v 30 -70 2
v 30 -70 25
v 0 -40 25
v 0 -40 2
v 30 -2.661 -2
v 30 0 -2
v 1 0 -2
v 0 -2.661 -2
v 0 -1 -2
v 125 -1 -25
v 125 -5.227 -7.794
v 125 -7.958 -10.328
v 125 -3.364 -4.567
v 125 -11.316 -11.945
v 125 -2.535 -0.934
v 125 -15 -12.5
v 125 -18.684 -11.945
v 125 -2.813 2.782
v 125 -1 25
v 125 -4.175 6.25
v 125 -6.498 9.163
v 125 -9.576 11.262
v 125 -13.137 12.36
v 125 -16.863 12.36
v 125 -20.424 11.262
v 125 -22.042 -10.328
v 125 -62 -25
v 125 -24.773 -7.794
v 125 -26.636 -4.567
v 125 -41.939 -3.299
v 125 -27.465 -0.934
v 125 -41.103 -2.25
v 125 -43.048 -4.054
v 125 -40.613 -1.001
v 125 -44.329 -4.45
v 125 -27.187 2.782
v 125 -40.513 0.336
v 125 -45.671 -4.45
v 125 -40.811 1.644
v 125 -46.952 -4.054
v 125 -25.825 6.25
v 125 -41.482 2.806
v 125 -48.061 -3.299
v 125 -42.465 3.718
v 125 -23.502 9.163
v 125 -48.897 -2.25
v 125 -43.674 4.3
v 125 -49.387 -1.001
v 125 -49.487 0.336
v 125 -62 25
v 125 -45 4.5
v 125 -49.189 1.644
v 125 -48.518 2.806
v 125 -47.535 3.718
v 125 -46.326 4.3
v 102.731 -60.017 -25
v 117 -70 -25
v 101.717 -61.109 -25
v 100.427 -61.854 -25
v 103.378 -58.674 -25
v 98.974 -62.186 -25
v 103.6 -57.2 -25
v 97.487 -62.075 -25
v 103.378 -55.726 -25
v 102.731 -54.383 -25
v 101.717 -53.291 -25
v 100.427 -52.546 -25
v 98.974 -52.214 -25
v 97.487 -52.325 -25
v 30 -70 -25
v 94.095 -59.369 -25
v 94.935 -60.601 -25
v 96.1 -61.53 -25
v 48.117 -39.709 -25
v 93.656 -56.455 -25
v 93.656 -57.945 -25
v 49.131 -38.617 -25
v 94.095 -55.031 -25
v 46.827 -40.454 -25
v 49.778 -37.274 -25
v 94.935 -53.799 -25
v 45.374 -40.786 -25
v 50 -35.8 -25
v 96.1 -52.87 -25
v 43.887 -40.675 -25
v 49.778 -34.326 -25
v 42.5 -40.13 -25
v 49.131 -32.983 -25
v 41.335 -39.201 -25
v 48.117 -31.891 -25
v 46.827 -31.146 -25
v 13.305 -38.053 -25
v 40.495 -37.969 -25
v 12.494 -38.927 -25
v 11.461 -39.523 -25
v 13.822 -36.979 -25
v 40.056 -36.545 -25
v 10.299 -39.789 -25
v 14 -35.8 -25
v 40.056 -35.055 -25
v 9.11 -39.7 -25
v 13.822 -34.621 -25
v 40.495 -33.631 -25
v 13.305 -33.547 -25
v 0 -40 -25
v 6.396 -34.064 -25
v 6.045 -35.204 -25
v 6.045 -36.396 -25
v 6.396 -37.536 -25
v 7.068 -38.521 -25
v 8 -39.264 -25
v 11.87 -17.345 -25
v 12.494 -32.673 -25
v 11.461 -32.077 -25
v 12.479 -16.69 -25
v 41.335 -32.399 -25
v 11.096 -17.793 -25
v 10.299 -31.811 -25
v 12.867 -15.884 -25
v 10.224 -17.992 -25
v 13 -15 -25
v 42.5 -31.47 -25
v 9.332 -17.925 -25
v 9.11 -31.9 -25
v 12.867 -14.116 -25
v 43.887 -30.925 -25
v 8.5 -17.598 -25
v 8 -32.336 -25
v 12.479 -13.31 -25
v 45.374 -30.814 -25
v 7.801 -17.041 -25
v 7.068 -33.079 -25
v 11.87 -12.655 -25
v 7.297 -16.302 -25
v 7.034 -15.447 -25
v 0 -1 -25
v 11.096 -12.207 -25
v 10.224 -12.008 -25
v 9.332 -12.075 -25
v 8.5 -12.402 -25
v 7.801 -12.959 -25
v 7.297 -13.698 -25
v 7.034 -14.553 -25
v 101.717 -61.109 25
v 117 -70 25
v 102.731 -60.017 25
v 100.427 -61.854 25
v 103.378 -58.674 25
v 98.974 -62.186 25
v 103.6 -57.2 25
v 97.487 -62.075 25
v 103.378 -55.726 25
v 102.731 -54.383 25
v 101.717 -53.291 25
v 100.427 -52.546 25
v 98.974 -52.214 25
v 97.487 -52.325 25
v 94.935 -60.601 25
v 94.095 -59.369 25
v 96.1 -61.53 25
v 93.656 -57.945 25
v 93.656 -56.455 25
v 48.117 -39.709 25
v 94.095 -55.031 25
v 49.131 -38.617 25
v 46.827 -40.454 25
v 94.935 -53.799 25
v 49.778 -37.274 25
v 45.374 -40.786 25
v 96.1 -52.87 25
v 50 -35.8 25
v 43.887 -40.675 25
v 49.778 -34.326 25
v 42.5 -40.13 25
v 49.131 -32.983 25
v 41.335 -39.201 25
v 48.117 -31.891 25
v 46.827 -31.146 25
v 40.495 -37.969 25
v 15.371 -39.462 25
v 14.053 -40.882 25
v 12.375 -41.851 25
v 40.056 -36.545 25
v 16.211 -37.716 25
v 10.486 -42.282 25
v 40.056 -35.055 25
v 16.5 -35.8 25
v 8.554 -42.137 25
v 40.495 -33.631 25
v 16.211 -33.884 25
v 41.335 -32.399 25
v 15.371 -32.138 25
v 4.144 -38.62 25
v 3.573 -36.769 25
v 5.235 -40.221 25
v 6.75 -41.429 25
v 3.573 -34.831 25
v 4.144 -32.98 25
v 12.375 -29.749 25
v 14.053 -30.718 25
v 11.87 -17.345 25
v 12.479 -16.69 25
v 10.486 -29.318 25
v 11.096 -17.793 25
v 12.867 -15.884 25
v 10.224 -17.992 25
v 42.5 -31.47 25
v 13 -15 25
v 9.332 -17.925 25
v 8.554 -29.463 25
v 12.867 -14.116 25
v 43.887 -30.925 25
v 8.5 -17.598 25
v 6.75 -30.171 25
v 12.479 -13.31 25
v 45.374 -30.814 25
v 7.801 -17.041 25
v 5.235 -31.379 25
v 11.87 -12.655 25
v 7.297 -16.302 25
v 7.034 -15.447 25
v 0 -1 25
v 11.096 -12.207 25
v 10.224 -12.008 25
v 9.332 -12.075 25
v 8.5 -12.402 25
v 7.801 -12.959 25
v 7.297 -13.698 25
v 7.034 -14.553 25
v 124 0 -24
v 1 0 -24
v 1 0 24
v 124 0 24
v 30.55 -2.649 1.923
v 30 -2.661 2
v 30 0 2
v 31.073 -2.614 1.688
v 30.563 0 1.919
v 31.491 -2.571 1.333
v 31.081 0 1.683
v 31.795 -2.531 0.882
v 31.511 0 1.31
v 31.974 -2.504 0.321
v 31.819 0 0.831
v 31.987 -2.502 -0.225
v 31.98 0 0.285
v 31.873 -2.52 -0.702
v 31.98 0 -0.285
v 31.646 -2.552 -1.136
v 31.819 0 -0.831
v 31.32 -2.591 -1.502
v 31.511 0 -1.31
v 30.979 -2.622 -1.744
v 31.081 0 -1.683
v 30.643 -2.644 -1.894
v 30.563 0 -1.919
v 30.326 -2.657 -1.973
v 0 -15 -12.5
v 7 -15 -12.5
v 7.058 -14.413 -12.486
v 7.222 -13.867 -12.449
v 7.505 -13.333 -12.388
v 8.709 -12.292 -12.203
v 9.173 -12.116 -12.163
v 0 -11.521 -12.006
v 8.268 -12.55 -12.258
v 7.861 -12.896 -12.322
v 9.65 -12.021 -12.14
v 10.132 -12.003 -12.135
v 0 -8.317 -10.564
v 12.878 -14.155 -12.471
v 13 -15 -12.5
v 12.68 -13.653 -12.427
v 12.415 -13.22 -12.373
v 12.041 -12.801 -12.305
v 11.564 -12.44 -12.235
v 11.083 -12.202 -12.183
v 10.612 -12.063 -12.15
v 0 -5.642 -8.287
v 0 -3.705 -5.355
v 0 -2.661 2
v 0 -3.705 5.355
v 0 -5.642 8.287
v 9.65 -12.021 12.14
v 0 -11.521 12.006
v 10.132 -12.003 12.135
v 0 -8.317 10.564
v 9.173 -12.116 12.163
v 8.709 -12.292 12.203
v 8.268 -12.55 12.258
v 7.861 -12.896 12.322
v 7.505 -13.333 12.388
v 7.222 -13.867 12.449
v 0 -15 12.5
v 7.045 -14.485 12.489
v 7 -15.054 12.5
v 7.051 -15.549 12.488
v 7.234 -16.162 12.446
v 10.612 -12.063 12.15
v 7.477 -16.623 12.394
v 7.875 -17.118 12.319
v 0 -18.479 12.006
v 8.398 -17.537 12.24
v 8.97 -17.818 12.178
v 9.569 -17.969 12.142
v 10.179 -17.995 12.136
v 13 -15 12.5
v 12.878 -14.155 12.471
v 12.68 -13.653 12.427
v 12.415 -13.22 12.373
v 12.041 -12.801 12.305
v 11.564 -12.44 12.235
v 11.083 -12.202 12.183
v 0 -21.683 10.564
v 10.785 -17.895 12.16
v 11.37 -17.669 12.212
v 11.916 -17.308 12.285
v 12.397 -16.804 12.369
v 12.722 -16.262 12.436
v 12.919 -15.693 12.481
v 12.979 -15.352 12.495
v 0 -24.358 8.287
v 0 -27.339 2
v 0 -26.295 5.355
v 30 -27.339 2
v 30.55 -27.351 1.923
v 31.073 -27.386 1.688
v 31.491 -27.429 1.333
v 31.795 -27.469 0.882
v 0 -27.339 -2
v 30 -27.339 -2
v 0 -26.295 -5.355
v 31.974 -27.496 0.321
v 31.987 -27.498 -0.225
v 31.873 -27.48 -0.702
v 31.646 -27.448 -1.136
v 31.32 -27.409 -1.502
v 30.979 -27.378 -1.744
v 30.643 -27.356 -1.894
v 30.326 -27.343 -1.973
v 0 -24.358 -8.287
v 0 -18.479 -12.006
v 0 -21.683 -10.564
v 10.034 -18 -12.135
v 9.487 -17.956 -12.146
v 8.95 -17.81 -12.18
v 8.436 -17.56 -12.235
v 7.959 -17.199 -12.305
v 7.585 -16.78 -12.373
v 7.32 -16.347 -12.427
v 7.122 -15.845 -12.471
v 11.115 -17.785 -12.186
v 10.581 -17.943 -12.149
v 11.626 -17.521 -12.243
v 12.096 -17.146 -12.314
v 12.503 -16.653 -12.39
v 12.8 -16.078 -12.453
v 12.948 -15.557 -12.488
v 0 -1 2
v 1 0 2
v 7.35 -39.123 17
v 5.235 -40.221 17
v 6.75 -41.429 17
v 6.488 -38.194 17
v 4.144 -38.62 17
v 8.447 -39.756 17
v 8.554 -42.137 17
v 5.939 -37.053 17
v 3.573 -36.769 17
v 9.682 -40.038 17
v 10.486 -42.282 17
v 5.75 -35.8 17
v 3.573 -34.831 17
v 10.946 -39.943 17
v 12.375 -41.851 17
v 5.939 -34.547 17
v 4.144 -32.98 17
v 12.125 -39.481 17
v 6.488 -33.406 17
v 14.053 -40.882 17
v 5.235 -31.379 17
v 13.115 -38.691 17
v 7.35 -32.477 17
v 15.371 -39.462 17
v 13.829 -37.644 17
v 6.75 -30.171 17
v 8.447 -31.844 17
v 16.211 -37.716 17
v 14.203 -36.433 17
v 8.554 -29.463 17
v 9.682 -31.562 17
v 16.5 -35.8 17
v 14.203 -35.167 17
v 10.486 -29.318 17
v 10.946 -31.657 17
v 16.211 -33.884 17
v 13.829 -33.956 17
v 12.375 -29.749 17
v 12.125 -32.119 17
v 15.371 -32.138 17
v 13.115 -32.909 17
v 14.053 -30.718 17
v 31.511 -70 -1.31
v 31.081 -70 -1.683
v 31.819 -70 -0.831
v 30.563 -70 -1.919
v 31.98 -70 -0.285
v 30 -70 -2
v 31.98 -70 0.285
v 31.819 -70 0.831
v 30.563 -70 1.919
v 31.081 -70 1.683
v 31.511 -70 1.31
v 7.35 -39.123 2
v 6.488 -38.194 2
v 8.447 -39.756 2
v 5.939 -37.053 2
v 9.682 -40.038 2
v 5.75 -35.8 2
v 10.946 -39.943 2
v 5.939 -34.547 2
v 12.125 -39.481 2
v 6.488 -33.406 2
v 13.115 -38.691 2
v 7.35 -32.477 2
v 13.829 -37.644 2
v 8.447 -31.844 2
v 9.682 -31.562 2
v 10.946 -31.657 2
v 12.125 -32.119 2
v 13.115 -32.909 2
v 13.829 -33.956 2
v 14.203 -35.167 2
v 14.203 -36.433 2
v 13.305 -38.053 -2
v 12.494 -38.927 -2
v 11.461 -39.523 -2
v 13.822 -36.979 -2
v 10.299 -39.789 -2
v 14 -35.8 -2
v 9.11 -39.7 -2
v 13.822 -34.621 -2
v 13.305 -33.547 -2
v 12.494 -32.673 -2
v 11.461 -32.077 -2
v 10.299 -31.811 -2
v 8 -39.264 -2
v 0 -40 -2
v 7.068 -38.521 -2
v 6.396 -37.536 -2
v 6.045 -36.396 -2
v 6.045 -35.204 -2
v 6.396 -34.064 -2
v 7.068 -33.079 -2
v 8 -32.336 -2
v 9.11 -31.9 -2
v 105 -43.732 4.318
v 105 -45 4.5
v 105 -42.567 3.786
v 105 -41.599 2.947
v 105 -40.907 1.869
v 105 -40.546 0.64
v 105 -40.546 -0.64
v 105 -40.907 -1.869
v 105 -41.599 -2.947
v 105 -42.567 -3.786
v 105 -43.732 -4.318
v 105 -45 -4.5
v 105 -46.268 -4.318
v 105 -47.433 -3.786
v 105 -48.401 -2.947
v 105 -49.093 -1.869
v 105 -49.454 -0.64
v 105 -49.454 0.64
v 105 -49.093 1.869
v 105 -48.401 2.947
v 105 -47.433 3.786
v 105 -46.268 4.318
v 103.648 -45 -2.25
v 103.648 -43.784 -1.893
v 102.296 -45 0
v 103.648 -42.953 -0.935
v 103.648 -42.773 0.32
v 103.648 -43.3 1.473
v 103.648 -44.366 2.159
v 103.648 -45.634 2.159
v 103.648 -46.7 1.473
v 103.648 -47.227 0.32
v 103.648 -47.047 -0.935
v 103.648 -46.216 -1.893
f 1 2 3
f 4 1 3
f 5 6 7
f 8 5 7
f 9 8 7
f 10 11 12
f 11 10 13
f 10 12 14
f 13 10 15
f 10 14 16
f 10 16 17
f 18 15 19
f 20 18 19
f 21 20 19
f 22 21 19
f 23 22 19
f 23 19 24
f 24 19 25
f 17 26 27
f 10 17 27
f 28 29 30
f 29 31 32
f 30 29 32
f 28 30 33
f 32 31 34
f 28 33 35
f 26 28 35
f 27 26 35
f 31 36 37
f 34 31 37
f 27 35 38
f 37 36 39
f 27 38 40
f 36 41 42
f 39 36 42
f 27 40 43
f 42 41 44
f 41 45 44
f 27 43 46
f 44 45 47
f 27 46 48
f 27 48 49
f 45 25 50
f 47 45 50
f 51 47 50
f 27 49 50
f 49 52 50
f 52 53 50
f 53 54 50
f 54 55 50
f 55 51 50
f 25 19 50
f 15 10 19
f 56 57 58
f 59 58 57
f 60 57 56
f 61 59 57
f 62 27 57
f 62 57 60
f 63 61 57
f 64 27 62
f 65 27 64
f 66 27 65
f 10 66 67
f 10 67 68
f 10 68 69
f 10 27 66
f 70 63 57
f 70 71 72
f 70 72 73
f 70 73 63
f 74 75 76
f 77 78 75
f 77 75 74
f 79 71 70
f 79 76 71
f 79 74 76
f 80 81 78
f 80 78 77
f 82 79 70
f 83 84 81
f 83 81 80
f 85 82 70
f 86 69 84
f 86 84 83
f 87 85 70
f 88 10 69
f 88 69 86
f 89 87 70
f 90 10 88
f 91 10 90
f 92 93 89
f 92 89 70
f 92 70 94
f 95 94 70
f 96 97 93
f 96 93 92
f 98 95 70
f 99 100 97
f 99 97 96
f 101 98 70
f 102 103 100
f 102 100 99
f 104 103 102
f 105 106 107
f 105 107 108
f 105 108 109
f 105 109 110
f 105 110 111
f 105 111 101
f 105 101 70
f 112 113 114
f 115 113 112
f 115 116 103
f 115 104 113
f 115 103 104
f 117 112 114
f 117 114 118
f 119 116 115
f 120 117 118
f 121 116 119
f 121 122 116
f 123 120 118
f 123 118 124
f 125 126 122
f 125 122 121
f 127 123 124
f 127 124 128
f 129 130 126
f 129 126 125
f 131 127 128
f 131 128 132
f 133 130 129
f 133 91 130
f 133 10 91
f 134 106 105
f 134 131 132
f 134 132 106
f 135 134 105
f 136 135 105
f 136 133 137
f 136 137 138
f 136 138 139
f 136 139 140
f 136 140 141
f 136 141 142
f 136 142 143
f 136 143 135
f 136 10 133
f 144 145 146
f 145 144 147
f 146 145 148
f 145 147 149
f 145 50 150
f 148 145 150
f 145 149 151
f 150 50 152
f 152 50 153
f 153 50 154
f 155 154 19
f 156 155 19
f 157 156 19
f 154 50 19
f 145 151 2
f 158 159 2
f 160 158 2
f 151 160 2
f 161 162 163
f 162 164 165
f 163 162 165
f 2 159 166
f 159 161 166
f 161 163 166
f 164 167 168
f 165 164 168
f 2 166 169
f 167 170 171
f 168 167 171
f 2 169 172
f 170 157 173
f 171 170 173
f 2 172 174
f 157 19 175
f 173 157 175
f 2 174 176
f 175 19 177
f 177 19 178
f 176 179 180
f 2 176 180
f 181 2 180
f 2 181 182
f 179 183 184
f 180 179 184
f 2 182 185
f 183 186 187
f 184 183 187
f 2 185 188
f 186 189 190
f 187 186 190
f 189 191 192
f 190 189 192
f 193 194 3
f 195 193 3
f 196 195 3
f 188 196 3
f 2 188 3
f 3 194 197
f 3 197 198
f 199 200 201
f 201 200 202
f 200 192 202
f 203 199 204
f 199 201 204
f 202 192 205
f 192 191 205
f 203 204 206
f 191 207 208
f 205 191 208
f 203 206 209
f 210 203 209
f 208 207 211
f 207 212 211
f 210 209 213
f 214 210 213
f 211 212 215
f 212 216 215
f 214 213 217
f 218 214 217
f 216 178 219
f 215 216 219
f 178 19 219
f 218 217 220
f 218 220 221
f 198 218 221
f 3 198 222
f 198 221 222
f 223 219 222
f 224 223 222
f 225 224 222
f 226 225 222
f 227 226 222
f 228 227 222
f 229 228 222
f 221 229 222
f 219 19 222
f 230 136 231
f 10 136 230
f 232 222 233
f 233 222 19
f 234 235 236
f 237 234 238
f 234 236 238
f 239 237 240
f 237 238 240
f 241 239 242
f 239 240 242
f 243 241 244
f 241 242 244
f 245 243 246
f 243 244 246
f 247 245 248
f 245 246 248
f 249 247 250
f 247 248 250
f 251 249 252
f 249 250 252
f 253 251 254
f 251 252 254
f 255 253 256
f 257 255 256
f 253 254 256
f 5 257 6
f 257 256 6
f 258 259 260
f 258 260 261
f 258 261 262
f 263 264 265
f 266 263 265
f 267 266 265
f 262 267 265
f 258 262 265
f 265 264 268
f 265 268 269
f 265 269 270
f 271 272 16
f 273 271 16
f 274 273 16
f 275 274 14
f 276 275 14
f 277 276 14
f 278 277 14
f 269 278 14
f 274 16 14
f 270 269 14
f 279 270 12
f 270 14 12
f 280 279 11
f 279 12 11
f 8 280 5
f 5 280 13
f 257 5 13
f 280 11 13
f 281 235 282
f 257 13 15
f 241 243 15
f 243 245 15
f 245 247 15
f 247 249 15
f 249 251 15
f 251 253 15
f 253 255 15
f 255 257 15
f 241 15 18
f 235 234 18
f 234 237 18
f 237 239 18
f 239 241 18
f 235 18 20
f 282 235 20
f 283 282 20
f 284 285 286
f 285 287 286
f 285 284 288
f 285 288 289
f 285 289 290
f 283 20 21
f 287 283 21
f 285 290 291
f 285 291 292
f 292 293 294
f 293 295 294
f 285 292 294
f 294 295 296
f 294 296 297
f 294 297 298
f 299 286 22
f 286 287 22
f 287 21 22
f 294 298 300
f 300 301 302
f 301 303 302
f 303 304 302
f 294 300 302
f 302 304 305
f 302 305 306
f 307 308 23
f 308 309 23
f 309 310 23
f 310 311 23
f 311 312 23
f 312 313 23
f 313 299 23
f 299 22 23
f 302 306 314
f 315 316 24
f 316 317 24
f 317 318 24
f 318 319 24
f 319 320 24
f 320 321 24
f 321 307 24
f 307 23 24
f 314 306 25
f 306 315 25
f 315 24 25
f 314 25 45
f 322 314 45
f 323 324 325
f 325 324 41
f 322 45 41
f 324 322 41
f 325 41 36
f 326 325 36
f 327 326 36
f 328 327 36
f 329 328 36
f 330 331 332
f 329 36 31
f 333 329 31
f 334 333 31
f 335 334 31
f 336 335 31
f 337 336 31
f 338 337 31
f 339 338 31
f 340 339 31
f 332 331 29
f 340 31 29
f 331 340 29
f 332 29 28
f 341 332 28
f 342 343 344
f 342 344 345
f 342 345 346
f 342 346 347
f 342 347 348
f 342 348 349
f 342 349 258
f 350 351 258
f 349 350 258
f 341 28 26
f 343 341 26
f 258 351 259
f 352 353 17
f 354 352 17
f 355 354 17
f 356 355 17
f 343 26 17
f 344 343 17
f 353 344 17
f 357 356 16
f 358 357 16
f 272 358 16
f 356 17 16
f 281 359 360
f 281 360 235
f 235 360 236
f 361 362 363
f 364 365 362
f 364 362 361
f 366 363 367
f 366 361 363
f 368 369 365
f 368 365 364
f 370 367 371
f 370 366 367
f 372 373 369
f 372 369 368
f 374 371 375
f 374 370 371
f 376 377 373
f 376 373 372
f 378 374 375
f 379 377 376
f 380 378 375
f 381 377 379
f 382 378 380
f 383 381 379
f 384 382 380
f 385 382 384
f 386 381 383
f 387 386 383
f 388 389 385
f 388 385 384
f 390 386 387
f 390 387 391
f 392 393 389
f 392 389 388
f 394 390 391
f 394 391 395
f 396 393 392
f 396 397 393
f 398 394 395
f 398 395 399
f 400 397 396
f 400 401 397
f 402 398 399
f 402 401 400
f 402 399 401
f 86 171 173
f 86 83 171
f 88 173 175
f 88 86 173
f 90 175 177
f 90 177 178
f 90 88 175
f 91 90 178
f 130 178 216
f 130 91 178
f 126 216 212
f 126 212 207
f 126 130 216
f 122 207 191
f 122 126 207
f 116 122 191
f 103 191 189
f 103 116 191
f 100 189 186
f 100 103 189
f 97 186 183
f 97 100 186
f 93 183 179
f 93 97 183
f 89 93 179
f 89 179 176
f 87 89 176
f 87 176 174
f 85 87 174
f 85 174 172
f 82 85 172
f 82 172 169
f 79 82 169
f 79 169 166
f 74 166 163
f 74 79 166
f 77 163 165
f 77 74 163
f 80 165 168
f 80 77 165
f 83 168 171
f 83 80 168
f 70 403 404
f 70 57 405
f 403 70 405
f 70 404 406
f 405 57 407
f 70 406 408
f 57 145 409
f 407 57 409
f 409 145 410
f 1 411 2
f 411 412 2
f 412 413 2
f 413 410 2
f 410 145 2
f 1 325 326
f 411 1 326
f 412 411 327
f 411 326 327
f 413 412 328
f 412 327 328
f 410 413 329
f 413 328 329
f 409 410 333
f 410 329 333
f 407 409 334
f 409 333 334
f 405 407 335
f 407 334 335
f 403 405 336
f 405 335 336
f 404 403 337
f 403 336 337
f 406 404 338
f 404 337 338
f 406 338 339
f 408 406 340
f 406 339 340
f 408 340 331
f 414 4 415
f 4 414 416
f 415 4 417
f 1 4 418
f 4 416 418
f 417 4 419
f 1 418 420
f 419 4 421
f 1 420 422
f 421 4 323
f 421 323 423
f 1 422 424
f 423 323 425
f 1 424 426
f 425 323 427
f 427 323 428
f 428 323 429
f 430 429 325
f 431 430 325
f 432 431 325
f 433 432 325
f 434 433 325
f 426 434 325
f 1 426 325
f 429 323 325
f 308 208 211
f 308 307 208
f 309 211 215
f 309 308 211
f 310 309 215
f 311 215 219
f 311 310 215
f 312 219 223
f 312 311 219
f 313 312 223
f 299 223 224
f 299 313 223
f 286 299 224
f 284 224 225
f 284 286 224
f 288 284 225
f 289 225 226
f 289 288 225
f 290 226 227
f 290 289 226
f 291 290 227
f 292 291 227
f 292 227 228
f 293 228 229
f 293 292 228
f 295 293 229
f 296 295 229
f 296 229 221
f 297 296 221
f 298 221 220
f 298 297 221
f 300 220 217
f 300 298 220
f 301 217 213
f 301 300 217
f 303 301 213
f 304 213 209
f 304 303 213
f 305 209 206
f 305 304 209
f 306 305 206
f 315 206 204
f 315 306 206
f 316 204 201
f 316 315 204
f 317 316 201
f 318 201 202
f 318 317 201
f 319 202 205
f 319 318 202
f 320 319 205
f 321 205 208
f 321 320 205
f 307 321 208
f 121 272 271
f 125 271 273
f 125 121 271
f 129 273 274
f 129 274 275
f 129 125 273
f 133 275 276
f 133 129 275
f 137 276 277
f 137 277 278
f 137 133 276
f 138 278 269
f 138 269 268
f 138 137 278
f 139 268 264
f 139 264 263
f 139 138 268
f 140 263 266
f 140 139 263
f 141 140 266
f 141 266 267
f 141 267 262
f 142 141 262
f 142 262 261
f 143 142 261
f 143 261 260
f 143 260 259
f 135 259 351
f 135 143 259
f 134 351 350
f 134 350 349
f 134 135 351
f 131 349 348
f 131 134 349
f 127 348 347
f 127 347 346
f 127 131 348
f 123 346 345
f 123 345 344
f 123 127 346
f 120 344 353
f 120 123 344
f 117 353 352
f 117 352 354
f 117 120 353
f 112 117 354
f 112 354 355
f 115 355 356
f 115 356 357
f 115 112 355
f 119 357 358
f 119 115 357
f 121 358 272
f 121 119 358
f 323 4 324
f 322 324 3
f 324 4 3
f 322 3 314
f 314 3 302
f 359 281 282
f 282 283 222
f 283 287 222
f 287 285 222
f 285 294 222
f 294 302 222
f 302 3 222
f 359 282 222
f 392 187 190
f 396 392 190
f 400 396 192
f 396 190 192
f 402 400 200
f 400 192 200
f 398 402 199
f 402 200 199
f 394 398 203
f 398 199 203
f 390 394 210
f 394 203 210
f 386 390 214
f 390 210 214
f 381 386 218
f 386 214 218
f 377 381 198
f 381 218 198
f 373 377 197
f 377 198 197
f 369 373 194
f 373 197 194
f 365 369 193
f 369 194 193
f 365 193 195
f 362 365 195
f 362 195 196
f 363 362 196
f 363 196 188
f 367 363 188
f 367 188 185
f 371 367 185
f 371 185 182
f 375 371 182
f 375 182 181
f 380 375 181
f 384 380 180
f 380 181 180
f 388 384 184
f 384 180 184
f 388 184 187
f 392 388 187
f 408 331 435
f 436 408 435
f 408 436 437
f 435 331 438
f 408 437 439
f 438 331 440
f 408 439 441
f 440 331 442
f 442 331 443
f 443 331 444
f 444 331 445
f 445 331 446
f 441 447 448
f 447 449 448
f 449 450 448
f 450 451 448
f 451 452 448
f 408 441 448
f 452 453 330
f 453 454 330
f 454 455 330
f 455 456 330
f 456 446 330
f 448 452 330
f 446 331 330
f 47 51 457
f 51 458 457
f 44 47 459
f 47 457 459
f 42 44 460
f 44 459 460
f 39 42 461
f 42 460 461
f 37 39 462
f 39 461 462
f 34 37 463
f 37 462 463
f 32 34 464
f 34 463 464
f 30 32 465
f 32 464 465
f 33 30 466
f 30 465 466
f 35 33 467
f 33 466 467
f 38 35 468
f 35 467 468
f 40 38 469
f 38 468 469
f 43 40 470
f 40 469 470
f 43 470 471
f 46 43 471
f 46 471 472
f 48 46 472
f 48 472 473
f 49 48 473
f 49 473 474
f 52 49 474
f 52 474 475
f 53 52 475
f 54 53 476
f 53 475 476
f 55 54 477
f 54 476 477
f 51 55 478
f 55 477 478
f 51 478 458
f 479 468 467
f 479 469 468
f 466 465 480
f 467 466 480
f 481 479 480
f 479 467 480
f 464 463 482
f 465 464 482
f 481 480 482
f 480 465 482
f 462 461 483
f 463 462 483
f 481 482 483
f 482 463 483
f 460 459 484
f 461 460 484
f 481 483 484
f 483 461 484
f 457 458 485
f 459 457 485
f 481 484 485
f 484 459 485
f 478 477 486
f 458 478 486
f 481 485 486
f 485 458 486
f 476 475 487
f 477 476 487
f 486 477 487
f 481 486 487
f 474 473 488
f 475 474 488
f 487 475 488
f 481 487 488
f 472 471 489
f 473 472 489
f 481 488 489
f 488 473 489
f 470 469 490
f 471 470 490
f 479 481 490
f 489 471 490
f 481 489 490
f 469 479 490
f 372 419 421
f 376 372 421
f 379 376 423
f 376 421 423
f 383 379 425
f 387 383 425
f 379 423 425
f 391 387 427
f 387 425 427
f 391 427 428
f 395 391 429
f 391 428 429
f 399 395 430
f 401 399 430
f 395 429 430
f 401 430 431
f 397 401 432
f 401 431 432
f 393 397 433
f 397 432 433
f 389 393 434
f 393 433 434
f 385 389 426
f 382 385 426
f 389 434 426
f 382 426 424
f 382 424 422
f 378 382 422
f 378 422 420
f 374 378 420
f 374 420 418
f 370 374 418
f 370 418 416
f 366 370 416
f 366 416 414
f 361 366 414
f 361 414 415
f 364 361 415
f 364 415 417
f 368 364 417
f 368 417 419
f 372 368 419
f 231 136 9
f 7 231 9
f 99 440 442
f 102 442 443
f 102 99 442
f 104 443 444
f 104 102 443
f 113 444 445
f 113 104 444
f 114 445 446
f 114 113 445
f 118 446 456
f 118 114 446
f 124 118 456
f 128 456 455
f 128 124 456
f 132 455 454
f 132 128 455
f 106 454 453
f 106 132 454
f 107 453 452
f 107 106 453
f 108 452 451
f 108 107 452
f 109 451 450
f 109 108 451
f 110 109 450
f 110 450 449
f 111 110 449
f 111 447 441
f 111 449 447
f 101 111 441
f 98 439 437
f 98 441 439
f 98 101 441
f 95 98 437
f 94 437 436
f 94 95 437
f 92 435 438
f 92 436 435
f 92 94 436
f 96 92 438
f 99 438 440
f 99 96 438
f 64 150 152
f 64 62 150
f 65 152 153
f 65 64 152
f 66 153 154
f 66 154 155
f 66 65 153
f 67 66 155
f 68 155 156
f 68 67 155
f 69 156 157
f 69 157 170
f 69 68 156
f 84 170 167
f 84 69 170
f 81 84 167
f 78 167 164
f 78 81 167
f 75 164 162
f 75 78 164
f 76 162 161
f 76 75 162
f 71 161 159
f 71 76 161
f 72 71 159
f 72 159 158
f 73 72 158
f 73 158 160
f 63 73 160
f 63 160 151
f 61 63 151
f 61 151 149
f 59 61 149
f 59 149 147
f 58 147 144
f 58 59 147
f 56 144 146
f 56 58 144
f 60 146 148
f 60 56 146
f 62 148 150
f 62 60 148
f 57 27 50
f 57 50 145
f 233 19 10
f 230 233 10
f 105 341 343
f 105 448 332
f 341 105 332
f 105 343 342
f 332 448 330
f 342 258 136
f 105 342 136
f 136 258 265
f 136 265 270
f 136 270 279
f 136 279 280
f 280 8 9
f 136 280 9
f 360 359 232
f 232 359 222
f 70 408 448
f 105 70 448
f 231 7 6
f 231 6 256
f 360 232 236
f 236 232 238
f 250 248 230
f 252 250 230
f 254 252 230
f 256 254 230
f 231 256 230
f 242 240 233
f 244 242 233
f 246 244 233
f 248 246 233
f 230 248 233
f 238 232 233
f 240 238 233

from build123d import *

# Parameters (mm, degrees)
CROQUIS1_R                     = 3
CROQUIS1_R_2                   = 4
CROQUIS1_R_3                   = 5
SALIENTE_EXTRUIR1_DEPTH        = 25
CHAFL_N1_SIZE                  = 1
CORTAR_EXTRUIR1_DEPTH          = 94.3
CROQUIS3_R                     = 4.25
CORTAR_EXTRUIR2_DEPTH          = 94.3
CROQUIS4_R                     = 6.5
CORTAR_EXTRUIR3_DEPTH          = 8
CROQUIS5_R                     = 12.5
CORTAR_EXTRUIR4_DEPTH          = 141.5
TALADRO_ROSCADO_M10X1_01_D     = 9
TALADRO_ROSCADO_M10X1_01_DEPTH = 20
TALADRO_ROSCADO_M10X1_01_TIP   = 2.703872786


with BuildPart() as part:
    # Croquis1 → Saliente-Extruir1 (new body, symmetric)
    with BuildSketch(Plane.XY):
        Polygon((0, 0), (125, 0), (125, -62), (117, -70), (30, -70), (0, -40), align=None)
        with Locations((10, -15)):
            Circle(CROQUIS1_R, mode=Mode.SUBTRACT)
        with Locations((10, -35.8)):
            Circle(CROQUIS1_R_2, mode=Mode.SUBTRACT)
        with Locations((45, -35.8)):
            Circle(CROQUIS1_R_3, mode=Mode.SUBTRACT)
        with Locations((98.6, -57.2)):
            Circle(CROQUIS1_R_3, mode=Mode.SUBTRACT)
    extrude(amount=SALIENTE_EXTRUIR1_DEPTH, both=True)

    # Chaflán1
    chafl_n1_edges = [part.edges().sort_by_distance(p)[0] for p in [
        (0, 0, 0),
        (125, 0, 0),
        (62.5, 0, 25),
        (62.5, 0, -25),
    ]]
    chamfer(chafl_n1_edges, length=CHAFL_N1_SIZE)

    # Croquis2 → Cortar-Extruir1 (cut)
    with BuildSketch(Plane(origin=(0, 0, 0), x_dir=(1, 0, 0), z_dir=(0, 1, 0))):
        with BuildLine():
            Line((30, 2), (-5.316293701, 2))
            Line((-5.316293701, 2), (-5.316293701, -2))
            Line((-5.316293701, -2), (30, -2))
            ThreePointArc((30, -2), (32, 0), (30, 2))
        make_face()
    extrude(amount=-CORTAR_EXTRUIR1_DEPTH, mode=Mode.SUBTRACT)

    # Croquis3 → Cortar-Extruir2 (cut)
    with BuildSketch(Plane(origin=(0, 0, 2), x_dir=(-1, 0, 0), z_dir=(0, 0, -1))):
        with Locations((-10, -35.8)):
            Circle(CROQUIS3_R)
    extrude(amount=-CORTAR_EXTRUIR2_DEPTH, mode=Mode.SUBTRACT)

    # Croquis4 → Cortar-Extruir3 (cut)
    with BuildSketch(Plane.XY.offset(25)):
        with Locations((10, -35.8)):
            Circle(CROQUIS4_R)
    extrude(amount=-CORTAR_EXTRUIR3_DEPTH, mode=Mode.SUBTRACT)

    # Croquis5 → Cortar-Extruir4 (cut)
    with BuildSketch(Plane(origin=(125, 0, 0), x_dir=(0, 0, -1), z_dir=(1, 0, 0))):
        with Locations((0, -15)):
            Circle(CROQUIS5_R)
    extrude(amount=-CORTAR_EXTRUIR4_DEPTH, mode=Mode.SUBTRACT)

    # Taladro roscado M10x1.01
    with Locations(Plane(origin=(125, 0, 0), x_dir=(0, 0, -1), z_dir=(1, 0, 0))):
        with Locations((0, -45)):
            Hole(TALADRO_ROSCADO_M10X1_01_D / 2, depth=TALADRO_ROSCADO_M10X1_01_DEPTH)
            with Locations((0, 0, -(TALADRO_ROSCADO_M10X1_01_DEPTH + TALADRO_ROSCADO_M10X1_01_TIP / 2))):  # 118° drill point
                Cone(0, TALADRO_ROSCADO_M10X1_01_D / 2, TALADRO_ROSCADO_M10X1_01_TIP, mode=Mode.SUBTRACT)


solid = part.part
